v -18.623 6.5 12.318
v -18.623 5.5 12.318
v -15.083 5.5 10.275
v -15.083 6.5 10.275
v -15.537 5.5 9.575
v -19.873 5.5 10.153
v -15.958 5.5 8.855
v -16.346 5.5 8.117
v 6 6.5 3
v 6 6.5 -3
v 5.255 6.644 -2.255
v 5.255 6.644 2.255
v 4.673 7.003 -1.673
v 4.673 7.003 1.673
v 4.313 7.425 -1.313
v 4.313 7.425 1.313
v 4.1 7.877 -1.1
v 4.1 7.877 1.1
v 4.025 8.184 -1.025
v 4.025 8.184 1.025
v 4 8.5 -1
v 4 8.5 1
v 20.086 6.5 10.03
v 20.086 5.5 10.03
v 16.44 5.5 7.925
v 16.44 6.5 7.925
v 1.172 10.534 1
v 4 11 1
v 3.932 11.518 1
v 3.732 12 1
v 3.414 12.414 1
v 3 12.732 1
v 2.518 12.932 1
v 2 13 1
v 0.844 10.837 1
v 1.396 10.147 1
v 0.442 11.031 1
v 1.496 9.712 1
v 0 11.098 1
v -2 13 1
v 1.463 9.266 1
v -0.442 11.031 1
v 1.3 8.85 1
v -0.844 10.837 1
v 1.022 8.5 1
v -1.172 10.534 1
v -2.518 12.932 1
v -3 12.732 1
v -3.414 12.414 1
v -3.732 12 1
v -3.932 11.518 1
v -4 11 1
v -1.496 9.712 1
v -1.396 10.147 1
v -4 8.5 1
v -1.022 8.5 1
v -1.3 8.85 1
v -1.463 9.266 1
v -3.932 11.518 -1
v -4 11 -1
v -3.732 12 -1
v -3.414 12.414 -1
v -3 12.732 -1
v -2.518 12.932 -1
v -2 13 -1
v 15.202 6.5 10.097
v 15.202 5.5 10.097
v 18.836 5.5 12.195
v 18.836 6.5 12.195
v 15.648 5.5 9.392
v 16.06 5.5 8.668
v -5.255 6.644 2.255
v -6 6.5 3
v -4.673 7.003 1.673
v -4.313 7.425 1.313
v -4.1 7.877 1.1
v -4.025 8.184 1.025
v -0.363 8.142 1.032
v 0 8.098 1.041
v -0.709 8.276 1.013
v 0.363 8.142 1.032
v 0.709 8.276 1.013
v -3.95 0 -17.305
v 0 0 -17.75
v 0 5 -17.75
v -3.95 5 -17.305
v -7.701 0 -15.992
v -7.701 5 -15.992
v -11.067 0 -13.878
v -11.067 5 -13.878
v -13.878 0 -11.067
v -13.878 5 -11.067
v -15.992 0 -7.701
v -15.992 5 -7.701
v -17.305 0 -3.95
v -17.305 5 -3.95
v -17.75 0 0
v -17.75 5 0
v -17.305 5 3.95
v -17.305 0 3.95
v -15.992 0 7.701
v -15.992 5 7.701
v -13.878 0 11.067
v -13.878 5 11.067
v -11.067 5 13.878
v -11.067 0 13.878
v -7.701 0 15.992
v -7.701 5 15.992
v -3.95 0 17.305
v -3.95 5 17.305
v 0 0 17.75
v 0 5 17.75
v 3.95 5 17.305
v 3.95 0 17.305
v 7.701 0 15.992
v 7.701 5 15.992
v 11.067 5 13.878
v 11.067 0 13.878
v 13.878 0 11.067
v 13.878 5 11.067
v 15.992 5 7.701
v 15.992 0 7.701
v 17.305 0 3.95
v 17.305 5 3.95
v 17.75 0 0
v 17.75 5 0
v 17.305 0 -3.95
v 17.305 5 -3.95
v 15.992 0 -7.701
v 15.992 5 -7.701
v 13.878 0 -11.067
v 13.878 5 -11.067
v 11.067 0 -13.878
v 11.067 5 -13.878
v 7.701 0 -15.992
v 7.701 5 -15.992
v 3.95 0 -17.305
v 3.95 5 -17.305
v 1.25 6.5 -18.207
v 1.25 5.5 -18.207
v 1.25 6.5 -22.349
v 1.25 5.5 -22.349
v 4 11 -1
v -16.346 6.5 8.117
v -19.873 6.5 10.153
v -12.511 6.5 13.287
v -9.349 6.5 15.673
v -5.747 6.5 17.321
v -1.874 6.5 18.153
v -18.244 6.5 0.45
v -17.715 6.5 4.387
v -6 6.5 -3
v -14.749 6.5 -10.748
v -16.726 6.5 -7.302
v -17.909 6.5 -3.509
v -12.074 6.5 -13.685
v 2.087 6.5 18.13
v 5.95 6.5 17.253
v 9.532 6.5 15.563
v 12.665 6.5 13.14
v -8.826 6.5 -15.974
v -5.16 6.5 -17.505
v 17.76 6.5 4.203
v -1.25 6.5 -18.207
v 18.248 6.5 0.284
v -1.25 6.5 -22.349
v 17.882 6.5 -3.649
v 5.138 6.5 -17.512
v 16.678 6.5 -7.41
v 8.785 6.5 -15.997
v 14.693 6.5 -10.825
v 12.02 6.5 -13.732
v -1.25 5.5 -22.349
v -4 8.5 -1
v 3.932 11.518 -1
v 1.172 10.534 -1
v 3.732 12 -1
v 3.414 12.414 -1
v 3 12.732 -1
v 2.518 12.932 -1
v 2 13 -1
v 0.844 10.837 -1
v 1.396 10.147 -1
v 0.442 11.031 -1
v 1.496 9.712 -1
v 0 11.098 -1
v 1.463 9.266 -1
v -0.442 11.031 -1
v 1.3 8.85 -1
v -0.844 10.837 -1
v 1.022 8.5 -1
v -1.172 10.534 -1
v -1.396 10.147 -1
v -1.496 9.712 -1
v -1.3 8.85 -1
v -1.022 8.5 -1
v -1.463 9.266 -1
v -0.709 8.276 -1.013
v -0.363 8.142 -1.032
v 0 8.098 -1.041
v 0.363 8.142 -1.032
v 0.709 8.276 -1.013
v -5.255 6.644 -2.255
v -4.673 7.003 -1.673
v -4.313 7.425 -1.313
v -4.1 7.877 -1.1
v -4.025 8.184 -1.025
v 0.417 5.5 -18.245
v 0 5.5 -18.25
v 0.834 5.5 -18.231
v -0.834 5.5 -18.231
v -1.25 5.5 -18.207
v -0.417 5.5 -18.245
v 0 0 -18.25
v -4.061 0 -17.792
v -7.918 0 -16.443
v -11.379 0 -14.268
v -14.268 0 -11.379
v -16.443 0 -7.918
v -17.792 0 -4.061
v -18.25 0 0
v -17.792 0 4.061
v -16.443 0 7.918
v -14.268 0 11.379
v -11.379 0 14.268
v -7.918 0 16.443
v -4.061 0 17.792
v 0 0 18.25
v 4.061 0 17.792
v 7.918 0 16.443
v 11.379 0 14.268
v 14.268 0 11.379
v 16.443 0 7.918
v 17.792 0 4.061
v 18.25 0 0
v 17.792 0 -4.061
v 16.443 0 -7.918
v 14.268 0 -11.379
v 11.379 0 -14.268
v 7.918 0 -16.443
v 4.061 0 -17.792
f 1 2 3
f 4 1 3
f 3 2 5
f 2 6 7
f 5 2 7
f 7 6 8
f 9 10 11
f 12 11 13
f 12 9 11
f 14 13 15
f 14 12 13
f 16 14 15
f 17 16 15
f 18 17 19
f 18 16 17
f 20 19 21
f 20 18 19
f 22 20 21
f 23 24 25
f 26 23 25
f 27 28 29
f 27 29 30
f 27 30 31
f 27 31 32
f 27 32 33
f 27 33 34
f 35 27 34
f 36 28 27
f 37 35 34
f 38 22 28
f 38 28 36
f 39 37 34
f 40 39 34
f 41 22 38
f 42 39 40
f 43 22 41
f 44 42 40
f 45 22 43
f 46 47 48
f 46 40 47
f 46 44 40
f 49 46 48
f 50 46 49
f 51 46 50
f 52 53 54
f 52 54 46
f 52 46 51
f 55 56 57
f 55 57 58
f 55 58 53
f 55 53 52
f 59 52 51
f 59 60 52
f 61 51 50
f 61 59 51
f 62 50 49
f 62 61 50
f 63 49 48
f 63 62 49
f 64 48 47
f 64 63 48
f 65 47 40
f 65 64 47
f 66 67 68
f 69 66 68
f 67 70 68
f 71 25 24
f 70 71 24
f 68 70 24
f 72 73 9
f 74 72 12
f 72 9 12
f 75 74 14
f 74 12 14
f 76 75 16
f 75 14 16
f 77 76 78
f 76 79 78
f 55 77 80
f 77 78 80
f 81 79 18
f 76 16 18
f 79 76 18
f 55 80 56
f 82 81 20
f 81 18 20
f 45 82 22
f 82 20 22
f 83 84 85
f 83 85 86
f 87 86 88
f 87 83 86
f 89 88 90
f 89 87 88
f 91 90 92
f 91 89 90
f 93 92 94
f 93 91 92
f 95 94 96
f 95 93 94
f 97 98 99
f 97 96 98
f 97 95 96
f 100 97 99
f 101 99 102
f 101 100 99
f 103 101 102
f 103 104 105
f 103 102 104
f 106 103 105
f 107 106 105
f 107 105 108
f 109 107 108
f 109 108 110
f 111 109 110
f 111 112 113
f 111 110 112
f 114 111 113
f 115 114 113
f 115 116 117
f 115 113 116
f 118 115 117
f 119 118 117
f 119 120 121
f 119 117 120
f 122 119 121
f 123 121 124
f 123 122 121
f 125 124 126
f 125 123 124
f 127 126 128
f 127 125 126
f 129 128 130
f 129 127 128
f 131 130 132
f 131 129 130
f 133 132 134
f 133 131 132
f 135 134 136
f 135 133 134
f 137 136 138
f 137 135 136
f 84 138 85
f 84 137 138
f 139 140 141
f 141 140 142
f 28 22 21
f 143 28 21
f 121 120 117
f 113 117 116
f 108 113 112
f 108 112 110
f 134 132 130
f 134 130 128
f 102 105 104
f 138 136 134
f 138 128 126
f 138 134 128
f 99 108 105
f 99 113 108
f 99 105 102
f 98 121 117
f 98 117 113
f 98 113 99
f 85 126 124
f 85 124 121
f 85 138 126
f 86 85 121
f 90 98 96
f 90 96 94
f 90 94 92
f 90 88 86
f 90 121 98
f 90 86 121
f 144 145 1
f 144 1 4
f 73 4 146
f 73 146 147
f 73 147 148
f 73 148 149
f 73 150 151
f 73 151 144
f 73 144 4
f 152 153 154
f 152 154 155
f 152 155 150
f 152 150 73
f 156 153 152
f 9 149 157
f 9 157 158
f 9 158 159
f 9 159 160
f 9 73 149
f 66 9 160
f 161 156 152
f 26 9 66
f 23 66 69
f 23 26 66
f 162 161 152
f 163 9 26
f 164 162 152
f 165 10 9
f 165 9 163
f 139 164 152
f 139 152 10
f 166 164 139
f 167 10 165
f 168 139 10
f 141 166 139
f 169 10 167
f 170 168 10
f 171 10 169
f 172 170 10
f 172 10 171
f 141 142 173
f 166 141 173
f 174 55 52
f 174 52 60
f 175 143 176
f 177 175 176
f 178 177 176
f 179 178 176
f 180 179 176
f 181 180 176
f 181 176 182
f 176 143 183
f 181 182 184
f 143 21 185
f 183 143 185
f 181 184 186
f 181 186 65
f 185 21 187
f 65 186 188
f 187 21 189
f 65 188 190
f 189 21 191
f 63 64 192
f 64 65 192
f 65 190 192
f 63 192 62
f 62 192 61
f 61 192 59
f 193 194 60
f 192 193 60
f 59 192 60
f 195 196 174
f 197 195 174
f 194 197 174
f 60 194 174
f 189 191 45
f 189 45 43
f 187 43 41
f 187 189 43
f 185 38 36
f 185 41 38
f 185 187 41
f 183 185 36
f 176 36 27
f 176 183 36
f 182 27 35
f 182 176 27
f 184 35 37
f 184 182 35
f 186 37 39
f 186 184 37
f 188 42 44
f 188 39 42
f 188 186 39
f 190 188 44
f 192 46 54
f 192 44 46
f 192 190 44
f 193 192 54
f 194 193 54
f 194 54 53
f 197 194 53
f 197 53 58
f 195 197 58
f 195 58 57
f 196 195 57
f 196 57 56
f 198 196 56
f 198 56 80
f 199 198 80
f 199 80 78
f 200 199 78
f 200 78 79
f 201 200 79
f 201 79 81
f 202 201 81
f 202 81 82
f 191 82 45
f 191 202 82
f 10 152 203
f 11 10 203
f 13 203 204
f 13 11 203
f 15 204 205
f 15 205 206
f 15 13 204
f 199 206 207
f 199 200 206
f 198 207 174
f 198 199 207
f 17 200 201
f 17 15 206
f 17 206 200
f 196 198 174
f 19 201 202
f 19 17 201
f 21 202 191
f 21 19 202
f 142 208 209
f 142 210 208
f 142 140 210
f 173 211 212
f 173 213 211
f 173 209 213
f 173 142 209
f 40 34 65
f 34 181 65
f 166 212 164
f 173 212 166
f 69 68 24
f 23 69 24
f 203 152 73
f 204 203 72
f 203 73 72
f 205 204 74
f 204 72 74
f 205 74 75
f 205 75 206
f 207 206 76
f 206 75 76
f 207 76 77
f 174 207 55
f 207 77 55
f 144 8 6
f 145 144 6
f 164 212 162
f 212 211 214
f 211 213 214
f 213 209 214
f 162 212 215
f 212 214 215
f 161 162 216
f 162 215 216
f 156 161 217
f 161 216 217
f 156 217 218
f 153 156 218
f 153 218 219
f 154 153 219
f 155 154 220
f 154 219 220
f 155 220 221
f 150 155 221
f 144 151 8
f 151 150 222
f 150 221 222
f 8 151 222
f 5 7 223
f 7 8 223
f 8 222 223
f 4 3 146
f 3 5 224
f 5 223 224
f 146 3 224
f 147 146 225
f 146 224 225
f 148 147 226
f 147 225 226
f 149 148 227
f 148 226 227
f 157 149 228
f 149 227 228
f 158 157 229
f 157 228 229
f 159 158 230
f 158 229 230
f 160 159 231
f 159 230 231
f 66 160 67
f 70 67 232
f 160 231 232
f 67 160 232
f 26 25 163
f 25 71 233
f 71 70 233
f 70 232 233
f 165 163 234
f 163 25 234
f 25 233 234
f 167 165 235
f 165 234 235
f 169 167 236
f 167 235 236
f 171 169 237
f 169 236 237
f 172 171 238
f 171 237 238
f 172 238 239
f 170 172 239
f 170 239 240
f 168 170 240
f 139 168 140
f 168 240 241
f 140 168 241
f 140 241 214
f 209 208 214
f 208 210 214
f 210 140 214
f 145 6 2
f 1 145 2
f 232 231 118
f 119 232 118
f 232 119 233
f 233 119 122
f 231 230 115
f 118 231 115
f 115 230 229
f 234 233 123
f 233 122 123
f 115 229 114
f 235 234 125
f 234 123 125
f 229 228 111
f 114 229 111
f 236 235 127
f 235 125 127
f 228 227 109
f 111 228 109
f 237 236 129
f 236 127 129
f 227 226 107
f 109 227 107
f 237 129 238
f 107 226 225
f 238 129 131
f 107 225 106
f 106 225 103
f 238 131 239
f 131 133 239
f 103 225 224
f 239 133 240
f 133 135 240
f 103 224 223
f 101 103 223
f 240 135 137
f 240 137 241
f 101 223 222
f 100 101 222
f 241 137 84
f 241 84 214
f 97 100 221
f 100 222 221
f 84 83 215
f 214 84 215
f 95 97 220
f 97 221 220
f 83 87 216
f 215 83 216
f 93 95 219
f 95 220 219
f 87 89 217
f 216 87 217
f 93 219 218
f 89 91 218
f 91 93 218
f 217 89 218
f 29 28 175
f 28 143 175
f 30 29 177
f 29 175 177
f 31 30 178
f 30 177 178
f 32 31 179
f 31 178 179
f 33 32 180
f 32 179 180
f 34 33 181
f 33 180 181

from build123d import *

# Parameters (mm, degrees)
SKETCH1_R               = 18.25
SKETCH1_R_2             = 17.75
BOSS_EXTRUDE1_DEPTH     = 6.5
BOSS_EXTRUDE2_START     = -1.5
SKETCH2_R               = 18.25
BOSS_EXTRUDE2_DEPTH     = 1.5
BOSS_EXTRUDE3_START     = -0.5
SKETCH3_W               = 2.5
SKETCH3_H               = 6.738143646
BOSS_EXTRUDE3_DEPTH     = 1
SKETCH4_W               = 8
SKETCH4_H               = 2
BOSS_EXTRUDE4_DEPTH     = 8
FILLET1_R               = 2
CUT_EXTRUDE1_DEPTH      = 34.430553991
CUT_EXTRUDE1_DEPTH_BACK = 34.430553991
SKETCH5_R               = 1.5
FILLET2_R               = 2


with BuildPart() as part:
    # Sketch1 → Boss-Extrude1 (new body)
    with BuildSketch(Plane(origin=(0, 0, 0), x_dir=(1, 0, 0), z_dir=(0, 1, 0))):
        with Locations(Location((0, 0, 0), (0, 0, 90))):
            Circle(SKETCH1_R)
        with Locations(Location((0, 0, 0), (0, 0, 90))):
            Circle(SKETCH1_R_2, mode=Mode.SUBTRACT)
    extrude(amount=BOSS_EXTRUDE1_DEPTH)

    # Sketch2 → Boss-Extrude2 (add)
    with BuildSketch(Plane(origin=(0, 6.5, 0), x_dir=(1, 0, 0), z_dir=(0, 1, 0)).offset(BOSS_EXTRUDE2_START)):
        with Locations(Location((0, 0, 0), (0, 0, 90))):
            Circle(SKETCH2_R)
    extrude(amount=BOSS_EXTRUDE2_DEPTH)

    # Sketch3 → Boss-Extrude3 (add)
    with BuildSketch(Plane(origin=(0, 5, 0), x_dir=(-1, 0, 0), z_dir=(0, -1, 0)).offset(BOSS_EXTRUDE3_START)):
        Polygon((18.622786456, -12.318351976), (12.787382884, -8.949280153), (14.037382884, -6.784216644), (19.872786456, -10.153288467), align=None)
        with Locations((0, 18.97946309)):
            Rectangle(SKETCH3_W, SKETCH3_H)
        Polygon((-20.086011489, -10.030182937), (-14.250607917, -6.661111114), (-13.000607917, -8.826174624), (-18.836011489, -12.195246447), align=None)
    extrude(amount=-BOSS_EXTRUDE3_DEPTH)

    # Sketch4 → Boss-Extrude4 (add)
    with BuildSketch(Plane(origin=(0, 5, 0), x_dir=(-1, 0, 0), z_dir=(0, -1, 0))):
        Rectangle(SKETCH4_W, SKETCH4_H)
    extrude(amount=-BOSS_EXTRUDE4_DEPTH)

    # Fillet1
    fillet1_edges = [part.edges().sort_by_distance(p)[0] for p in [
        (-4, 6.5, 0),
        (0, 6.5, 1),
        (4, 6.5, 0),
        (0, 6.5, -1),
    ]]
    fillet(fillet1_edges, radius=FILLET1_R)

    # Sketch5 → Cut-Extrude1 (cut, two sides: drawn at the far end of the back side and taken through both)
    with BuildSketch(Plane.XY.offset(1).offset(-CUT_EXTRUDE1_DEPTH_BACK)):
        with Locations(Location((0, 9.597763348, 0), (0, 0, 312.958942011))):
            Circle(SKETCH5_R)
    extrude(amount=CUT_EXTRUDE1_DEPTH + CUT_EXTRUDE1_DEPTH_BACK, mode=Mode.SUBTRACT)

    # Fillet2
    fillet2_edges = [part.edges().sort_by_distance(p)[0] for p in [
        (-4, 13, 0),
        (4, 13, 0),
    ]]
    fillet(fillet2_edges, radius=FILLET2_R)


solid = part.part
